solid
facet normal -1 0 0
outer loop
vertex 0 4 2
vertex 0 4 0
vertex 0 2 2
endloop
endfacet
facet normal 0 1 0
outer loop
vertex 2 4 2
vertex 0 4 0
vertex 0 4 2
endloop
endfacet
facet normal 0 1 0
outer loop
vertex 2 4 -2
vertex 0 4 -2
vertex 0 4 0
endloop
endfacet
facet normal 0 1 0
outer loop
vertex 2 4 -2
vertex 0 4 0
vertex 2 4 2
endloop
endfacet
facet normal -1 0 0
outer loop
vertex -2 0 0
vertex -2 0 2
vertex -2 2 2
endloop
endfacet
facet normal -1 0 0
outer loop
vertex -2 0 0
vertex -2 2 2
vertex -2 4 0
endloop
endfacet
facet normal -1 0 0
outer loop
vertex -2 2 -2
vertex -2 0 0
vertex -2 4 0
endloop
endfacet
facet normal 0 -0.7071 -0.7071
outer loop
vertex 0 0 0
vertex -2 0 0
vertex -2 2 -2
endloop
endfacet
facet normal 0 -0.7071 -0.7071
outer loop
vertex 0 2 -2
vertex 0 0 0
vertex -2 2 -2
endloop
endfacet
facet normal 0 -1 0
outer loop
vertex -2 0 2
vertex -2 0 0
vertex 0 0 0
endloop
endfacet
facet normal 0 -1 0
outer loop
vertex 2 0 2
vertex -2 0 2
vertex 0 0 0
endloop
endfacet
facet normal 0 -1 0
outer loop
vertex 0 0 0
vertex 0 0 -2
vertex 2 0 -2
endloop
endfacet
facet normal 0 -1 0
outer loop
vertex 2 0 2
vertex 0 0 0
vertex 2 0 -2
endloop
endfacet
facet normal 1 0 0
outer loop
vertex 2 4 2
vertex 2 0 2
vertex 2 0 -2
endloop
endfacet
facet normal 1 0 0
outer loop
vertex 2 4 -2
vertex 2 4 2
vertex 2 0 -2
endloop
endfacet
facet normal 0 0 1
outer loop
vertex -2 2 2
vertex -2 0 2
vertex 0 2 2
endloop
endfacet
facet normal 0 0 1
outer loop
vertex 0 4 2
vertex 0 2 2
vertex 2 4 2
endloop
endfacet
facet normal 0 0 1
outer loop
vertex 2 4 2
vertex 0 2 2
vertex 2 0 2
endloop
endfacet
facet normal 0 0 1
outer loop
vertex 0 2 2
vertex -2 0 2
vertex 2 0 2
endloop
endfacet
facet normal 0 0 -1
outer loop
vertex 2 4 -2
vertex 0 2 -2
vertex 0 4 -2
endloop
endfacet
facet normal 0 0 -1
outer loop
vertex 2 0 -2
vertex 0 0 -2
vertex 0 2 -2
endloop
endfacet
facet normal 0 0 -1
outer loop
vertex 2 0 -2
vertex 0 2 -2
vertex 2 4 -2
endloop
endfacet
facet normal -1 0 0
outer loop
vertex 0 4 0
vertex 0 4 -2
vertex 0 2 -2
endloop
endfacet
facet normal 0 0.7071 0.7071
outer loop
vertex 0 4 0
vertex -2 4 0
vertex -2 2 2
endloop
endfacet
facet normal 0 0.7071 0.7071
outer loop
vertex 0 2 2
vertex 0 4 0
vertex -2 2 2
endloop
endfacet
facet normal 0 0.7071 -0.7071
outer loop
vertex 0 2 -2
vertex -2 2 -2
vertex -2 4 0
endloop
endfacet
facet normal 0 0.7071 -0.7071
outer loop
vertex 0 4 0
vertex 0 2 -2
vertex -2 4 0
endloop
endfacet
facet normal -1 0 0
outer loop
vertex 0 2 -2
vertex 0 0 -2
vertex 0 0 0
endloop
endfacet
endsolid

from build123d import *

# Parameters (mm, degrees)
SKETCH1_W           = 4
SKETCH1_H           = 4
BOSS_EXTRUDE1_DEPTH = 4
CUT_EXTRUDE1_DEPTH  = 2


with BuildPart() as part:
    # Sketch1 → Boss-Extrude1 (new body)
    with BuildSketch(Plane(origin=(0, 0, 0), x_dir=(1, 0, 0), z_dir=(0, 1, 0))):
        Rectangle(SKETCH1_W, SKETCH1_H)
    extrude(amount=BOSS_EXTRUDE1_DEPTH)

    # Sketch2 → Cut-Extrude1 (cut)
    with BuildSketch(Plane.ZY.offset(2)):
        Polygon((0, 4), (2, 2), (2, 4), align=None)
        Polygon((0, 0), (-2, 2), (-2, 0), align=None)
        Polygon((-2, 2), (0, 4), (-2, 4), align=None)
    extrude(amount=-CUT_EXTRUDE1_DEPTH, mode=Mode.SUBTRACT)


solid = part.part
